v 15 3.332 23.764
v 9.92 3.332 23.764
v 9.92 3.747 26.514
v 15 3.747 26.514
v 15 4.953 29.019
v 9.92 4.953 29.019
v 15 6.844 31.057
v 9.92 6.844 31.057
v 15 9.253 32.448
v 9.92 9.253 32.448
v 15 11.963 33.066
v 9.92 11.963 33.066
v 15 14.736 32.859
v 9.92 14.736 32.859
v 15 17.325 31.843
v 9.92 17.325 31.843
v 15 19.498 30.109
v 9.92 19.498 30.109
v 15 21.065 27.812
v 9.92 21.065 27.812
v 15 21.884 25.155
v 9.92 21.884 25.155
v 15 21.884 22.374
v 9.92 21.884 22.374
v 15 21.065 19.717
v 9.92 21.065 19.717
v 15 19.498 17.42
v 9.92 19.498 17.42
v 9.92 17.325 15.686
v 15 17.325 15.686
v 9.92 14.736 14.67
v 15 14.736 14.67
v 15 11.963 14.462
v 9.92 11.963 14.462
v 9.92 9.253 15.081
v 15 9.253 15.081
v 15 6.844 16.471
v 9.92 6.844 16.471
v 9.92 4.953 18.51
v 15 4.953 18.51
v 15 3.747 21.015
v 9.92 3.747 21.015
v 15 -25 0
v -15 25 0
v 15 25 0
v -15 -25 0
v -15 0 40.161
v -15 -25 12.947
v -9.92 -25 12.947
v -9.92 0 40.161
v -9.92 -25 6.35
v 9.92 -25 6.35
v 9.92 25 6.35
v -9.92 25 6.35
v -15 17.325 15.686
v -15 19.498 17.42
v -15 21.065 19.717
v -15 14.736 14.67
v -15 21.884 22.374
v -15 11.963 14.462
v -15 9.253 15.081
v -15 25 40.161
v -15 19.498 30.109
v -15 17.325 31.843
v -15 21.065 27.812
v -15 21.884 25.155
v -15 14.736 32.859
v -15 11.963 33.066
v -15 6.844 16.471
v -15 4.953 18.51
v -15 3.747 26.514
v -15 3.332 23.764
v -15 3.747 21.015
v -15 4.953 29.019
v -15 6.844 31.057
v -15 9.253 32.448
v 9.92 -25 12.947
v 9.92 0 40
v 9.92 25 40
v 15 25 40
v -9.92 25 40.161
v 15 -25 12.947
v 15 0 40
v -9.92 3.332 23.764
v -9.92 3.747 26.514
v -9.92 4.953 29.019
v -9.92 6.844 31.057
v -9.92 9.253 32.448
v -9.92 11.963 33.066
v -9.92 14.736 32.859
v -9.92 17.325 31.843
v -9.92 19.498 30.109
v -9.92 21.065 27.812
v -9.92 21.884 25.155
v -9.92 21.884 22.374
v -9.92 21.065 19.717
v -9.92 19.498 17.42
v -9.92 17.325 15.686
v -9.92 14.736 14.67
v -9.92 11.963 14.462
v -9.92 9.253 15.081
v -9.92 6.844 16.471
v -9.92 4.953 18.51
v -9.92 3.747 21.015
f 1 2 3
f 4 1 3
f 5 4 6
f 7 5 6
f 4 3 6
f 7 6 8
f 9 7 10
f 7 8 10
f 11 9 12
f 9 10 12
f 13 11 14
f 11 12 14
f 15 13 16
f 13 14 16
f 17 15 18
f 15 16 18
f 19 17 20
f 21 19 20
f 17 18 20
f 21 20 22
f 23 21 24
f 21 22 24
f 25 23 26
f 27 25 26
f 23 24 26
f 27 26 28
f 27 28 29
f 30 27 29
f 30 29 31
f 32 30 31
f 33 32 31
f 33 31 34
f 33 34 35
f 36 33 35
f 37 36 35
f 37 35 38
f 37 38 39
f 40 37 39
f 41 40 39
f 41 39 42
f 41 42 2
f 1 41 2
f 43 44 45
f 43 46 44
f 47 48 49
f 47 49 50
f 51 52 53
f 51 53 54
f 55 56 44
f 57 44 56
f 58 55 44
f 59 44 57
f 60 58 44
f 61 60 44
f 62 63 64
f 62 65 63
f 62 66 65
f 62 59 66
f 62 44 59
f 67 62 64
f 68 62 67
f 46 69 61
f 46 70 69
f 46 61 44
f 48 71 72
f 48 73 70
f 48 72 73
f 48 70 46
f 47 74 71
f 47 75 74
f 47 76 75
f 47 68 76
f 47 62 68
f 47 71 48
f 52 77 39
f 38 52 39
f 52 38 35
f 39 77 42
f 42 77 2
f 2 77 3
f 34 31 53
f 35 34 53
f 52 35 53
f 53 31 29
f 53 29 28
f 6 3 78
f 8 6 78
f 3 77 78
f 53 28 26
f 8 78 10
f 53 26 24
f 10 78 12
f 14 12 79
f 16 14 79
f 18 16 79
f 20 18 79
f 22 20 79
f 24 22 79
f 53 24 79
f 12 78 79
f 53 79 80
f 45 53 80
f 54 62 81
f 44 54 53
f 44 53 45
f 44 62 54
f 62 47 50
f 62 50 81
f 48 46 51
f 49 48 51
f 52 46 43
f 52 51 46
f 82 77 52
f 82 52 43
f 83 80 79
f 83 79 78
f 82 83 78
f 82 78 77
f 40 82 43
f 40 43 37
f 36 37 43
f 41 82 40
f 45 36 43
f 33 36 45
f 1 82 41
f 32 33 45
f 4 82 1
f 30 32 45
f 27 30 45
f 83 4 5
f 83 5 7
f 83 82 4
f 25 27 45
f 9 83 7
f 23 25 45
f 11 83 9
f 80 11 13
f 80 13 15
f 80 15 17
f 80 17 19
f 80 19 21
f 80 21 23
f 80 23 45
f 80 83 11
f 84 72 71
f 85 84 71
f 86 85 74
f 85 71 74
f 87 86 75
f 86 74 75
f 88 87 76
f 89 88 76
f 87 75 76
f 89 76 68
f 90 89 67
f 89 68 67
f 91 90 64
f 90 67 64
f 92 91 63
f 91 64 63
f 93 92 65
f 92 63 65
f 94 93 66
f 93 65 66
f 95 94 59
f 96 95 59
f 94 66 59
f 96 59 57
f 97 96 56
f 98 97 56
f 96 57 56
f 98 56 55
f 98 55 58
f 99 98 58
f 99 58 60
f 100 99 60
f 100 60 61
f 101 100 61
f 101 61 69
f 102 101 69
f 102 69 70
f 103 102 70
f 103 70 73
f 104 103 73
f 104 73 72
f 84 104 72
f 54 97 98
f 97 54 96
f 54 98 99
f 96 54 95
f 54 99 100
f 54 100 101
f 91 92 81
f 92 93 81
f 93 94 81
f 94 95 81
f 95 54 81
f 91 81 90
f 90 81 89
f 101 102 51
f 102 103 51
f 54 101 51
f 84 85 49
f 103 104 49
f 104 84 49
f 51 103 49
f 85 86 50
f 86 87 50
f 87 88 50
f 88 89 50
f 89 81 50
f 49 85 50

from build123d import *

# Parameters (mm, degrees)
F1_DEPTH = 25
F3_DEPTH = 5.08
F5_DEPTH = 5.08
F6_R     = 9.328151
F7_DEPTH = 30.001


with BuildPart() as f1:
    # F0 (on Front) → F1 (new body, symmetric)
    with BuildSketch(Plane.XZ):
        Polygon((-15, 0), (0, 0), (15, 0), (15, 6.35), (15, 12.947081), (9.92, 12.947081), (9.92, 6.35), (0, 6.35), (-9.92, 6.35), (-9.92, 12.947081), (-15, 12.947081), (-15, 6.35), align=None)
    extrude(amount=F1_DEPTH, both=True)

    # F2 (on face) → F3 (join)
    with BuildSketch(Plane.YZ.offset(15)):
        Polygon((25, 12.947081), (25, 40), (0, 40), (-25, 12.947081), align=None)
    extrude(amount=-F3_DEPTH)

    # F4 (on face) → F5 (join)
    with BuildSketch(Plane(origin=(-15, 0, 0), x_dir=(0, -1, 0), z_dir=(-1, 0, 0))):
        Polygon((-25, 40.16066), (-25, 12.947081), (0, 12.947081), (25, 12.947081), (0, 40.16066), align=None)
    extrude(amount=-F5_DEPTH)

    # F6 (on face) → F7 (cut, through all)
    with BuildSketch(Plane(origin=(-15, 0, 0), x_dir=(0, -1, 0), z_dir=(-1, 0, 0))):
        with Locations((-12.660467, 23.76432)):
            Circle(F6_R)
    extrude(amount=-F7_DEPTH, mode=Mode.SUBTRACT)


solid = f1.part
